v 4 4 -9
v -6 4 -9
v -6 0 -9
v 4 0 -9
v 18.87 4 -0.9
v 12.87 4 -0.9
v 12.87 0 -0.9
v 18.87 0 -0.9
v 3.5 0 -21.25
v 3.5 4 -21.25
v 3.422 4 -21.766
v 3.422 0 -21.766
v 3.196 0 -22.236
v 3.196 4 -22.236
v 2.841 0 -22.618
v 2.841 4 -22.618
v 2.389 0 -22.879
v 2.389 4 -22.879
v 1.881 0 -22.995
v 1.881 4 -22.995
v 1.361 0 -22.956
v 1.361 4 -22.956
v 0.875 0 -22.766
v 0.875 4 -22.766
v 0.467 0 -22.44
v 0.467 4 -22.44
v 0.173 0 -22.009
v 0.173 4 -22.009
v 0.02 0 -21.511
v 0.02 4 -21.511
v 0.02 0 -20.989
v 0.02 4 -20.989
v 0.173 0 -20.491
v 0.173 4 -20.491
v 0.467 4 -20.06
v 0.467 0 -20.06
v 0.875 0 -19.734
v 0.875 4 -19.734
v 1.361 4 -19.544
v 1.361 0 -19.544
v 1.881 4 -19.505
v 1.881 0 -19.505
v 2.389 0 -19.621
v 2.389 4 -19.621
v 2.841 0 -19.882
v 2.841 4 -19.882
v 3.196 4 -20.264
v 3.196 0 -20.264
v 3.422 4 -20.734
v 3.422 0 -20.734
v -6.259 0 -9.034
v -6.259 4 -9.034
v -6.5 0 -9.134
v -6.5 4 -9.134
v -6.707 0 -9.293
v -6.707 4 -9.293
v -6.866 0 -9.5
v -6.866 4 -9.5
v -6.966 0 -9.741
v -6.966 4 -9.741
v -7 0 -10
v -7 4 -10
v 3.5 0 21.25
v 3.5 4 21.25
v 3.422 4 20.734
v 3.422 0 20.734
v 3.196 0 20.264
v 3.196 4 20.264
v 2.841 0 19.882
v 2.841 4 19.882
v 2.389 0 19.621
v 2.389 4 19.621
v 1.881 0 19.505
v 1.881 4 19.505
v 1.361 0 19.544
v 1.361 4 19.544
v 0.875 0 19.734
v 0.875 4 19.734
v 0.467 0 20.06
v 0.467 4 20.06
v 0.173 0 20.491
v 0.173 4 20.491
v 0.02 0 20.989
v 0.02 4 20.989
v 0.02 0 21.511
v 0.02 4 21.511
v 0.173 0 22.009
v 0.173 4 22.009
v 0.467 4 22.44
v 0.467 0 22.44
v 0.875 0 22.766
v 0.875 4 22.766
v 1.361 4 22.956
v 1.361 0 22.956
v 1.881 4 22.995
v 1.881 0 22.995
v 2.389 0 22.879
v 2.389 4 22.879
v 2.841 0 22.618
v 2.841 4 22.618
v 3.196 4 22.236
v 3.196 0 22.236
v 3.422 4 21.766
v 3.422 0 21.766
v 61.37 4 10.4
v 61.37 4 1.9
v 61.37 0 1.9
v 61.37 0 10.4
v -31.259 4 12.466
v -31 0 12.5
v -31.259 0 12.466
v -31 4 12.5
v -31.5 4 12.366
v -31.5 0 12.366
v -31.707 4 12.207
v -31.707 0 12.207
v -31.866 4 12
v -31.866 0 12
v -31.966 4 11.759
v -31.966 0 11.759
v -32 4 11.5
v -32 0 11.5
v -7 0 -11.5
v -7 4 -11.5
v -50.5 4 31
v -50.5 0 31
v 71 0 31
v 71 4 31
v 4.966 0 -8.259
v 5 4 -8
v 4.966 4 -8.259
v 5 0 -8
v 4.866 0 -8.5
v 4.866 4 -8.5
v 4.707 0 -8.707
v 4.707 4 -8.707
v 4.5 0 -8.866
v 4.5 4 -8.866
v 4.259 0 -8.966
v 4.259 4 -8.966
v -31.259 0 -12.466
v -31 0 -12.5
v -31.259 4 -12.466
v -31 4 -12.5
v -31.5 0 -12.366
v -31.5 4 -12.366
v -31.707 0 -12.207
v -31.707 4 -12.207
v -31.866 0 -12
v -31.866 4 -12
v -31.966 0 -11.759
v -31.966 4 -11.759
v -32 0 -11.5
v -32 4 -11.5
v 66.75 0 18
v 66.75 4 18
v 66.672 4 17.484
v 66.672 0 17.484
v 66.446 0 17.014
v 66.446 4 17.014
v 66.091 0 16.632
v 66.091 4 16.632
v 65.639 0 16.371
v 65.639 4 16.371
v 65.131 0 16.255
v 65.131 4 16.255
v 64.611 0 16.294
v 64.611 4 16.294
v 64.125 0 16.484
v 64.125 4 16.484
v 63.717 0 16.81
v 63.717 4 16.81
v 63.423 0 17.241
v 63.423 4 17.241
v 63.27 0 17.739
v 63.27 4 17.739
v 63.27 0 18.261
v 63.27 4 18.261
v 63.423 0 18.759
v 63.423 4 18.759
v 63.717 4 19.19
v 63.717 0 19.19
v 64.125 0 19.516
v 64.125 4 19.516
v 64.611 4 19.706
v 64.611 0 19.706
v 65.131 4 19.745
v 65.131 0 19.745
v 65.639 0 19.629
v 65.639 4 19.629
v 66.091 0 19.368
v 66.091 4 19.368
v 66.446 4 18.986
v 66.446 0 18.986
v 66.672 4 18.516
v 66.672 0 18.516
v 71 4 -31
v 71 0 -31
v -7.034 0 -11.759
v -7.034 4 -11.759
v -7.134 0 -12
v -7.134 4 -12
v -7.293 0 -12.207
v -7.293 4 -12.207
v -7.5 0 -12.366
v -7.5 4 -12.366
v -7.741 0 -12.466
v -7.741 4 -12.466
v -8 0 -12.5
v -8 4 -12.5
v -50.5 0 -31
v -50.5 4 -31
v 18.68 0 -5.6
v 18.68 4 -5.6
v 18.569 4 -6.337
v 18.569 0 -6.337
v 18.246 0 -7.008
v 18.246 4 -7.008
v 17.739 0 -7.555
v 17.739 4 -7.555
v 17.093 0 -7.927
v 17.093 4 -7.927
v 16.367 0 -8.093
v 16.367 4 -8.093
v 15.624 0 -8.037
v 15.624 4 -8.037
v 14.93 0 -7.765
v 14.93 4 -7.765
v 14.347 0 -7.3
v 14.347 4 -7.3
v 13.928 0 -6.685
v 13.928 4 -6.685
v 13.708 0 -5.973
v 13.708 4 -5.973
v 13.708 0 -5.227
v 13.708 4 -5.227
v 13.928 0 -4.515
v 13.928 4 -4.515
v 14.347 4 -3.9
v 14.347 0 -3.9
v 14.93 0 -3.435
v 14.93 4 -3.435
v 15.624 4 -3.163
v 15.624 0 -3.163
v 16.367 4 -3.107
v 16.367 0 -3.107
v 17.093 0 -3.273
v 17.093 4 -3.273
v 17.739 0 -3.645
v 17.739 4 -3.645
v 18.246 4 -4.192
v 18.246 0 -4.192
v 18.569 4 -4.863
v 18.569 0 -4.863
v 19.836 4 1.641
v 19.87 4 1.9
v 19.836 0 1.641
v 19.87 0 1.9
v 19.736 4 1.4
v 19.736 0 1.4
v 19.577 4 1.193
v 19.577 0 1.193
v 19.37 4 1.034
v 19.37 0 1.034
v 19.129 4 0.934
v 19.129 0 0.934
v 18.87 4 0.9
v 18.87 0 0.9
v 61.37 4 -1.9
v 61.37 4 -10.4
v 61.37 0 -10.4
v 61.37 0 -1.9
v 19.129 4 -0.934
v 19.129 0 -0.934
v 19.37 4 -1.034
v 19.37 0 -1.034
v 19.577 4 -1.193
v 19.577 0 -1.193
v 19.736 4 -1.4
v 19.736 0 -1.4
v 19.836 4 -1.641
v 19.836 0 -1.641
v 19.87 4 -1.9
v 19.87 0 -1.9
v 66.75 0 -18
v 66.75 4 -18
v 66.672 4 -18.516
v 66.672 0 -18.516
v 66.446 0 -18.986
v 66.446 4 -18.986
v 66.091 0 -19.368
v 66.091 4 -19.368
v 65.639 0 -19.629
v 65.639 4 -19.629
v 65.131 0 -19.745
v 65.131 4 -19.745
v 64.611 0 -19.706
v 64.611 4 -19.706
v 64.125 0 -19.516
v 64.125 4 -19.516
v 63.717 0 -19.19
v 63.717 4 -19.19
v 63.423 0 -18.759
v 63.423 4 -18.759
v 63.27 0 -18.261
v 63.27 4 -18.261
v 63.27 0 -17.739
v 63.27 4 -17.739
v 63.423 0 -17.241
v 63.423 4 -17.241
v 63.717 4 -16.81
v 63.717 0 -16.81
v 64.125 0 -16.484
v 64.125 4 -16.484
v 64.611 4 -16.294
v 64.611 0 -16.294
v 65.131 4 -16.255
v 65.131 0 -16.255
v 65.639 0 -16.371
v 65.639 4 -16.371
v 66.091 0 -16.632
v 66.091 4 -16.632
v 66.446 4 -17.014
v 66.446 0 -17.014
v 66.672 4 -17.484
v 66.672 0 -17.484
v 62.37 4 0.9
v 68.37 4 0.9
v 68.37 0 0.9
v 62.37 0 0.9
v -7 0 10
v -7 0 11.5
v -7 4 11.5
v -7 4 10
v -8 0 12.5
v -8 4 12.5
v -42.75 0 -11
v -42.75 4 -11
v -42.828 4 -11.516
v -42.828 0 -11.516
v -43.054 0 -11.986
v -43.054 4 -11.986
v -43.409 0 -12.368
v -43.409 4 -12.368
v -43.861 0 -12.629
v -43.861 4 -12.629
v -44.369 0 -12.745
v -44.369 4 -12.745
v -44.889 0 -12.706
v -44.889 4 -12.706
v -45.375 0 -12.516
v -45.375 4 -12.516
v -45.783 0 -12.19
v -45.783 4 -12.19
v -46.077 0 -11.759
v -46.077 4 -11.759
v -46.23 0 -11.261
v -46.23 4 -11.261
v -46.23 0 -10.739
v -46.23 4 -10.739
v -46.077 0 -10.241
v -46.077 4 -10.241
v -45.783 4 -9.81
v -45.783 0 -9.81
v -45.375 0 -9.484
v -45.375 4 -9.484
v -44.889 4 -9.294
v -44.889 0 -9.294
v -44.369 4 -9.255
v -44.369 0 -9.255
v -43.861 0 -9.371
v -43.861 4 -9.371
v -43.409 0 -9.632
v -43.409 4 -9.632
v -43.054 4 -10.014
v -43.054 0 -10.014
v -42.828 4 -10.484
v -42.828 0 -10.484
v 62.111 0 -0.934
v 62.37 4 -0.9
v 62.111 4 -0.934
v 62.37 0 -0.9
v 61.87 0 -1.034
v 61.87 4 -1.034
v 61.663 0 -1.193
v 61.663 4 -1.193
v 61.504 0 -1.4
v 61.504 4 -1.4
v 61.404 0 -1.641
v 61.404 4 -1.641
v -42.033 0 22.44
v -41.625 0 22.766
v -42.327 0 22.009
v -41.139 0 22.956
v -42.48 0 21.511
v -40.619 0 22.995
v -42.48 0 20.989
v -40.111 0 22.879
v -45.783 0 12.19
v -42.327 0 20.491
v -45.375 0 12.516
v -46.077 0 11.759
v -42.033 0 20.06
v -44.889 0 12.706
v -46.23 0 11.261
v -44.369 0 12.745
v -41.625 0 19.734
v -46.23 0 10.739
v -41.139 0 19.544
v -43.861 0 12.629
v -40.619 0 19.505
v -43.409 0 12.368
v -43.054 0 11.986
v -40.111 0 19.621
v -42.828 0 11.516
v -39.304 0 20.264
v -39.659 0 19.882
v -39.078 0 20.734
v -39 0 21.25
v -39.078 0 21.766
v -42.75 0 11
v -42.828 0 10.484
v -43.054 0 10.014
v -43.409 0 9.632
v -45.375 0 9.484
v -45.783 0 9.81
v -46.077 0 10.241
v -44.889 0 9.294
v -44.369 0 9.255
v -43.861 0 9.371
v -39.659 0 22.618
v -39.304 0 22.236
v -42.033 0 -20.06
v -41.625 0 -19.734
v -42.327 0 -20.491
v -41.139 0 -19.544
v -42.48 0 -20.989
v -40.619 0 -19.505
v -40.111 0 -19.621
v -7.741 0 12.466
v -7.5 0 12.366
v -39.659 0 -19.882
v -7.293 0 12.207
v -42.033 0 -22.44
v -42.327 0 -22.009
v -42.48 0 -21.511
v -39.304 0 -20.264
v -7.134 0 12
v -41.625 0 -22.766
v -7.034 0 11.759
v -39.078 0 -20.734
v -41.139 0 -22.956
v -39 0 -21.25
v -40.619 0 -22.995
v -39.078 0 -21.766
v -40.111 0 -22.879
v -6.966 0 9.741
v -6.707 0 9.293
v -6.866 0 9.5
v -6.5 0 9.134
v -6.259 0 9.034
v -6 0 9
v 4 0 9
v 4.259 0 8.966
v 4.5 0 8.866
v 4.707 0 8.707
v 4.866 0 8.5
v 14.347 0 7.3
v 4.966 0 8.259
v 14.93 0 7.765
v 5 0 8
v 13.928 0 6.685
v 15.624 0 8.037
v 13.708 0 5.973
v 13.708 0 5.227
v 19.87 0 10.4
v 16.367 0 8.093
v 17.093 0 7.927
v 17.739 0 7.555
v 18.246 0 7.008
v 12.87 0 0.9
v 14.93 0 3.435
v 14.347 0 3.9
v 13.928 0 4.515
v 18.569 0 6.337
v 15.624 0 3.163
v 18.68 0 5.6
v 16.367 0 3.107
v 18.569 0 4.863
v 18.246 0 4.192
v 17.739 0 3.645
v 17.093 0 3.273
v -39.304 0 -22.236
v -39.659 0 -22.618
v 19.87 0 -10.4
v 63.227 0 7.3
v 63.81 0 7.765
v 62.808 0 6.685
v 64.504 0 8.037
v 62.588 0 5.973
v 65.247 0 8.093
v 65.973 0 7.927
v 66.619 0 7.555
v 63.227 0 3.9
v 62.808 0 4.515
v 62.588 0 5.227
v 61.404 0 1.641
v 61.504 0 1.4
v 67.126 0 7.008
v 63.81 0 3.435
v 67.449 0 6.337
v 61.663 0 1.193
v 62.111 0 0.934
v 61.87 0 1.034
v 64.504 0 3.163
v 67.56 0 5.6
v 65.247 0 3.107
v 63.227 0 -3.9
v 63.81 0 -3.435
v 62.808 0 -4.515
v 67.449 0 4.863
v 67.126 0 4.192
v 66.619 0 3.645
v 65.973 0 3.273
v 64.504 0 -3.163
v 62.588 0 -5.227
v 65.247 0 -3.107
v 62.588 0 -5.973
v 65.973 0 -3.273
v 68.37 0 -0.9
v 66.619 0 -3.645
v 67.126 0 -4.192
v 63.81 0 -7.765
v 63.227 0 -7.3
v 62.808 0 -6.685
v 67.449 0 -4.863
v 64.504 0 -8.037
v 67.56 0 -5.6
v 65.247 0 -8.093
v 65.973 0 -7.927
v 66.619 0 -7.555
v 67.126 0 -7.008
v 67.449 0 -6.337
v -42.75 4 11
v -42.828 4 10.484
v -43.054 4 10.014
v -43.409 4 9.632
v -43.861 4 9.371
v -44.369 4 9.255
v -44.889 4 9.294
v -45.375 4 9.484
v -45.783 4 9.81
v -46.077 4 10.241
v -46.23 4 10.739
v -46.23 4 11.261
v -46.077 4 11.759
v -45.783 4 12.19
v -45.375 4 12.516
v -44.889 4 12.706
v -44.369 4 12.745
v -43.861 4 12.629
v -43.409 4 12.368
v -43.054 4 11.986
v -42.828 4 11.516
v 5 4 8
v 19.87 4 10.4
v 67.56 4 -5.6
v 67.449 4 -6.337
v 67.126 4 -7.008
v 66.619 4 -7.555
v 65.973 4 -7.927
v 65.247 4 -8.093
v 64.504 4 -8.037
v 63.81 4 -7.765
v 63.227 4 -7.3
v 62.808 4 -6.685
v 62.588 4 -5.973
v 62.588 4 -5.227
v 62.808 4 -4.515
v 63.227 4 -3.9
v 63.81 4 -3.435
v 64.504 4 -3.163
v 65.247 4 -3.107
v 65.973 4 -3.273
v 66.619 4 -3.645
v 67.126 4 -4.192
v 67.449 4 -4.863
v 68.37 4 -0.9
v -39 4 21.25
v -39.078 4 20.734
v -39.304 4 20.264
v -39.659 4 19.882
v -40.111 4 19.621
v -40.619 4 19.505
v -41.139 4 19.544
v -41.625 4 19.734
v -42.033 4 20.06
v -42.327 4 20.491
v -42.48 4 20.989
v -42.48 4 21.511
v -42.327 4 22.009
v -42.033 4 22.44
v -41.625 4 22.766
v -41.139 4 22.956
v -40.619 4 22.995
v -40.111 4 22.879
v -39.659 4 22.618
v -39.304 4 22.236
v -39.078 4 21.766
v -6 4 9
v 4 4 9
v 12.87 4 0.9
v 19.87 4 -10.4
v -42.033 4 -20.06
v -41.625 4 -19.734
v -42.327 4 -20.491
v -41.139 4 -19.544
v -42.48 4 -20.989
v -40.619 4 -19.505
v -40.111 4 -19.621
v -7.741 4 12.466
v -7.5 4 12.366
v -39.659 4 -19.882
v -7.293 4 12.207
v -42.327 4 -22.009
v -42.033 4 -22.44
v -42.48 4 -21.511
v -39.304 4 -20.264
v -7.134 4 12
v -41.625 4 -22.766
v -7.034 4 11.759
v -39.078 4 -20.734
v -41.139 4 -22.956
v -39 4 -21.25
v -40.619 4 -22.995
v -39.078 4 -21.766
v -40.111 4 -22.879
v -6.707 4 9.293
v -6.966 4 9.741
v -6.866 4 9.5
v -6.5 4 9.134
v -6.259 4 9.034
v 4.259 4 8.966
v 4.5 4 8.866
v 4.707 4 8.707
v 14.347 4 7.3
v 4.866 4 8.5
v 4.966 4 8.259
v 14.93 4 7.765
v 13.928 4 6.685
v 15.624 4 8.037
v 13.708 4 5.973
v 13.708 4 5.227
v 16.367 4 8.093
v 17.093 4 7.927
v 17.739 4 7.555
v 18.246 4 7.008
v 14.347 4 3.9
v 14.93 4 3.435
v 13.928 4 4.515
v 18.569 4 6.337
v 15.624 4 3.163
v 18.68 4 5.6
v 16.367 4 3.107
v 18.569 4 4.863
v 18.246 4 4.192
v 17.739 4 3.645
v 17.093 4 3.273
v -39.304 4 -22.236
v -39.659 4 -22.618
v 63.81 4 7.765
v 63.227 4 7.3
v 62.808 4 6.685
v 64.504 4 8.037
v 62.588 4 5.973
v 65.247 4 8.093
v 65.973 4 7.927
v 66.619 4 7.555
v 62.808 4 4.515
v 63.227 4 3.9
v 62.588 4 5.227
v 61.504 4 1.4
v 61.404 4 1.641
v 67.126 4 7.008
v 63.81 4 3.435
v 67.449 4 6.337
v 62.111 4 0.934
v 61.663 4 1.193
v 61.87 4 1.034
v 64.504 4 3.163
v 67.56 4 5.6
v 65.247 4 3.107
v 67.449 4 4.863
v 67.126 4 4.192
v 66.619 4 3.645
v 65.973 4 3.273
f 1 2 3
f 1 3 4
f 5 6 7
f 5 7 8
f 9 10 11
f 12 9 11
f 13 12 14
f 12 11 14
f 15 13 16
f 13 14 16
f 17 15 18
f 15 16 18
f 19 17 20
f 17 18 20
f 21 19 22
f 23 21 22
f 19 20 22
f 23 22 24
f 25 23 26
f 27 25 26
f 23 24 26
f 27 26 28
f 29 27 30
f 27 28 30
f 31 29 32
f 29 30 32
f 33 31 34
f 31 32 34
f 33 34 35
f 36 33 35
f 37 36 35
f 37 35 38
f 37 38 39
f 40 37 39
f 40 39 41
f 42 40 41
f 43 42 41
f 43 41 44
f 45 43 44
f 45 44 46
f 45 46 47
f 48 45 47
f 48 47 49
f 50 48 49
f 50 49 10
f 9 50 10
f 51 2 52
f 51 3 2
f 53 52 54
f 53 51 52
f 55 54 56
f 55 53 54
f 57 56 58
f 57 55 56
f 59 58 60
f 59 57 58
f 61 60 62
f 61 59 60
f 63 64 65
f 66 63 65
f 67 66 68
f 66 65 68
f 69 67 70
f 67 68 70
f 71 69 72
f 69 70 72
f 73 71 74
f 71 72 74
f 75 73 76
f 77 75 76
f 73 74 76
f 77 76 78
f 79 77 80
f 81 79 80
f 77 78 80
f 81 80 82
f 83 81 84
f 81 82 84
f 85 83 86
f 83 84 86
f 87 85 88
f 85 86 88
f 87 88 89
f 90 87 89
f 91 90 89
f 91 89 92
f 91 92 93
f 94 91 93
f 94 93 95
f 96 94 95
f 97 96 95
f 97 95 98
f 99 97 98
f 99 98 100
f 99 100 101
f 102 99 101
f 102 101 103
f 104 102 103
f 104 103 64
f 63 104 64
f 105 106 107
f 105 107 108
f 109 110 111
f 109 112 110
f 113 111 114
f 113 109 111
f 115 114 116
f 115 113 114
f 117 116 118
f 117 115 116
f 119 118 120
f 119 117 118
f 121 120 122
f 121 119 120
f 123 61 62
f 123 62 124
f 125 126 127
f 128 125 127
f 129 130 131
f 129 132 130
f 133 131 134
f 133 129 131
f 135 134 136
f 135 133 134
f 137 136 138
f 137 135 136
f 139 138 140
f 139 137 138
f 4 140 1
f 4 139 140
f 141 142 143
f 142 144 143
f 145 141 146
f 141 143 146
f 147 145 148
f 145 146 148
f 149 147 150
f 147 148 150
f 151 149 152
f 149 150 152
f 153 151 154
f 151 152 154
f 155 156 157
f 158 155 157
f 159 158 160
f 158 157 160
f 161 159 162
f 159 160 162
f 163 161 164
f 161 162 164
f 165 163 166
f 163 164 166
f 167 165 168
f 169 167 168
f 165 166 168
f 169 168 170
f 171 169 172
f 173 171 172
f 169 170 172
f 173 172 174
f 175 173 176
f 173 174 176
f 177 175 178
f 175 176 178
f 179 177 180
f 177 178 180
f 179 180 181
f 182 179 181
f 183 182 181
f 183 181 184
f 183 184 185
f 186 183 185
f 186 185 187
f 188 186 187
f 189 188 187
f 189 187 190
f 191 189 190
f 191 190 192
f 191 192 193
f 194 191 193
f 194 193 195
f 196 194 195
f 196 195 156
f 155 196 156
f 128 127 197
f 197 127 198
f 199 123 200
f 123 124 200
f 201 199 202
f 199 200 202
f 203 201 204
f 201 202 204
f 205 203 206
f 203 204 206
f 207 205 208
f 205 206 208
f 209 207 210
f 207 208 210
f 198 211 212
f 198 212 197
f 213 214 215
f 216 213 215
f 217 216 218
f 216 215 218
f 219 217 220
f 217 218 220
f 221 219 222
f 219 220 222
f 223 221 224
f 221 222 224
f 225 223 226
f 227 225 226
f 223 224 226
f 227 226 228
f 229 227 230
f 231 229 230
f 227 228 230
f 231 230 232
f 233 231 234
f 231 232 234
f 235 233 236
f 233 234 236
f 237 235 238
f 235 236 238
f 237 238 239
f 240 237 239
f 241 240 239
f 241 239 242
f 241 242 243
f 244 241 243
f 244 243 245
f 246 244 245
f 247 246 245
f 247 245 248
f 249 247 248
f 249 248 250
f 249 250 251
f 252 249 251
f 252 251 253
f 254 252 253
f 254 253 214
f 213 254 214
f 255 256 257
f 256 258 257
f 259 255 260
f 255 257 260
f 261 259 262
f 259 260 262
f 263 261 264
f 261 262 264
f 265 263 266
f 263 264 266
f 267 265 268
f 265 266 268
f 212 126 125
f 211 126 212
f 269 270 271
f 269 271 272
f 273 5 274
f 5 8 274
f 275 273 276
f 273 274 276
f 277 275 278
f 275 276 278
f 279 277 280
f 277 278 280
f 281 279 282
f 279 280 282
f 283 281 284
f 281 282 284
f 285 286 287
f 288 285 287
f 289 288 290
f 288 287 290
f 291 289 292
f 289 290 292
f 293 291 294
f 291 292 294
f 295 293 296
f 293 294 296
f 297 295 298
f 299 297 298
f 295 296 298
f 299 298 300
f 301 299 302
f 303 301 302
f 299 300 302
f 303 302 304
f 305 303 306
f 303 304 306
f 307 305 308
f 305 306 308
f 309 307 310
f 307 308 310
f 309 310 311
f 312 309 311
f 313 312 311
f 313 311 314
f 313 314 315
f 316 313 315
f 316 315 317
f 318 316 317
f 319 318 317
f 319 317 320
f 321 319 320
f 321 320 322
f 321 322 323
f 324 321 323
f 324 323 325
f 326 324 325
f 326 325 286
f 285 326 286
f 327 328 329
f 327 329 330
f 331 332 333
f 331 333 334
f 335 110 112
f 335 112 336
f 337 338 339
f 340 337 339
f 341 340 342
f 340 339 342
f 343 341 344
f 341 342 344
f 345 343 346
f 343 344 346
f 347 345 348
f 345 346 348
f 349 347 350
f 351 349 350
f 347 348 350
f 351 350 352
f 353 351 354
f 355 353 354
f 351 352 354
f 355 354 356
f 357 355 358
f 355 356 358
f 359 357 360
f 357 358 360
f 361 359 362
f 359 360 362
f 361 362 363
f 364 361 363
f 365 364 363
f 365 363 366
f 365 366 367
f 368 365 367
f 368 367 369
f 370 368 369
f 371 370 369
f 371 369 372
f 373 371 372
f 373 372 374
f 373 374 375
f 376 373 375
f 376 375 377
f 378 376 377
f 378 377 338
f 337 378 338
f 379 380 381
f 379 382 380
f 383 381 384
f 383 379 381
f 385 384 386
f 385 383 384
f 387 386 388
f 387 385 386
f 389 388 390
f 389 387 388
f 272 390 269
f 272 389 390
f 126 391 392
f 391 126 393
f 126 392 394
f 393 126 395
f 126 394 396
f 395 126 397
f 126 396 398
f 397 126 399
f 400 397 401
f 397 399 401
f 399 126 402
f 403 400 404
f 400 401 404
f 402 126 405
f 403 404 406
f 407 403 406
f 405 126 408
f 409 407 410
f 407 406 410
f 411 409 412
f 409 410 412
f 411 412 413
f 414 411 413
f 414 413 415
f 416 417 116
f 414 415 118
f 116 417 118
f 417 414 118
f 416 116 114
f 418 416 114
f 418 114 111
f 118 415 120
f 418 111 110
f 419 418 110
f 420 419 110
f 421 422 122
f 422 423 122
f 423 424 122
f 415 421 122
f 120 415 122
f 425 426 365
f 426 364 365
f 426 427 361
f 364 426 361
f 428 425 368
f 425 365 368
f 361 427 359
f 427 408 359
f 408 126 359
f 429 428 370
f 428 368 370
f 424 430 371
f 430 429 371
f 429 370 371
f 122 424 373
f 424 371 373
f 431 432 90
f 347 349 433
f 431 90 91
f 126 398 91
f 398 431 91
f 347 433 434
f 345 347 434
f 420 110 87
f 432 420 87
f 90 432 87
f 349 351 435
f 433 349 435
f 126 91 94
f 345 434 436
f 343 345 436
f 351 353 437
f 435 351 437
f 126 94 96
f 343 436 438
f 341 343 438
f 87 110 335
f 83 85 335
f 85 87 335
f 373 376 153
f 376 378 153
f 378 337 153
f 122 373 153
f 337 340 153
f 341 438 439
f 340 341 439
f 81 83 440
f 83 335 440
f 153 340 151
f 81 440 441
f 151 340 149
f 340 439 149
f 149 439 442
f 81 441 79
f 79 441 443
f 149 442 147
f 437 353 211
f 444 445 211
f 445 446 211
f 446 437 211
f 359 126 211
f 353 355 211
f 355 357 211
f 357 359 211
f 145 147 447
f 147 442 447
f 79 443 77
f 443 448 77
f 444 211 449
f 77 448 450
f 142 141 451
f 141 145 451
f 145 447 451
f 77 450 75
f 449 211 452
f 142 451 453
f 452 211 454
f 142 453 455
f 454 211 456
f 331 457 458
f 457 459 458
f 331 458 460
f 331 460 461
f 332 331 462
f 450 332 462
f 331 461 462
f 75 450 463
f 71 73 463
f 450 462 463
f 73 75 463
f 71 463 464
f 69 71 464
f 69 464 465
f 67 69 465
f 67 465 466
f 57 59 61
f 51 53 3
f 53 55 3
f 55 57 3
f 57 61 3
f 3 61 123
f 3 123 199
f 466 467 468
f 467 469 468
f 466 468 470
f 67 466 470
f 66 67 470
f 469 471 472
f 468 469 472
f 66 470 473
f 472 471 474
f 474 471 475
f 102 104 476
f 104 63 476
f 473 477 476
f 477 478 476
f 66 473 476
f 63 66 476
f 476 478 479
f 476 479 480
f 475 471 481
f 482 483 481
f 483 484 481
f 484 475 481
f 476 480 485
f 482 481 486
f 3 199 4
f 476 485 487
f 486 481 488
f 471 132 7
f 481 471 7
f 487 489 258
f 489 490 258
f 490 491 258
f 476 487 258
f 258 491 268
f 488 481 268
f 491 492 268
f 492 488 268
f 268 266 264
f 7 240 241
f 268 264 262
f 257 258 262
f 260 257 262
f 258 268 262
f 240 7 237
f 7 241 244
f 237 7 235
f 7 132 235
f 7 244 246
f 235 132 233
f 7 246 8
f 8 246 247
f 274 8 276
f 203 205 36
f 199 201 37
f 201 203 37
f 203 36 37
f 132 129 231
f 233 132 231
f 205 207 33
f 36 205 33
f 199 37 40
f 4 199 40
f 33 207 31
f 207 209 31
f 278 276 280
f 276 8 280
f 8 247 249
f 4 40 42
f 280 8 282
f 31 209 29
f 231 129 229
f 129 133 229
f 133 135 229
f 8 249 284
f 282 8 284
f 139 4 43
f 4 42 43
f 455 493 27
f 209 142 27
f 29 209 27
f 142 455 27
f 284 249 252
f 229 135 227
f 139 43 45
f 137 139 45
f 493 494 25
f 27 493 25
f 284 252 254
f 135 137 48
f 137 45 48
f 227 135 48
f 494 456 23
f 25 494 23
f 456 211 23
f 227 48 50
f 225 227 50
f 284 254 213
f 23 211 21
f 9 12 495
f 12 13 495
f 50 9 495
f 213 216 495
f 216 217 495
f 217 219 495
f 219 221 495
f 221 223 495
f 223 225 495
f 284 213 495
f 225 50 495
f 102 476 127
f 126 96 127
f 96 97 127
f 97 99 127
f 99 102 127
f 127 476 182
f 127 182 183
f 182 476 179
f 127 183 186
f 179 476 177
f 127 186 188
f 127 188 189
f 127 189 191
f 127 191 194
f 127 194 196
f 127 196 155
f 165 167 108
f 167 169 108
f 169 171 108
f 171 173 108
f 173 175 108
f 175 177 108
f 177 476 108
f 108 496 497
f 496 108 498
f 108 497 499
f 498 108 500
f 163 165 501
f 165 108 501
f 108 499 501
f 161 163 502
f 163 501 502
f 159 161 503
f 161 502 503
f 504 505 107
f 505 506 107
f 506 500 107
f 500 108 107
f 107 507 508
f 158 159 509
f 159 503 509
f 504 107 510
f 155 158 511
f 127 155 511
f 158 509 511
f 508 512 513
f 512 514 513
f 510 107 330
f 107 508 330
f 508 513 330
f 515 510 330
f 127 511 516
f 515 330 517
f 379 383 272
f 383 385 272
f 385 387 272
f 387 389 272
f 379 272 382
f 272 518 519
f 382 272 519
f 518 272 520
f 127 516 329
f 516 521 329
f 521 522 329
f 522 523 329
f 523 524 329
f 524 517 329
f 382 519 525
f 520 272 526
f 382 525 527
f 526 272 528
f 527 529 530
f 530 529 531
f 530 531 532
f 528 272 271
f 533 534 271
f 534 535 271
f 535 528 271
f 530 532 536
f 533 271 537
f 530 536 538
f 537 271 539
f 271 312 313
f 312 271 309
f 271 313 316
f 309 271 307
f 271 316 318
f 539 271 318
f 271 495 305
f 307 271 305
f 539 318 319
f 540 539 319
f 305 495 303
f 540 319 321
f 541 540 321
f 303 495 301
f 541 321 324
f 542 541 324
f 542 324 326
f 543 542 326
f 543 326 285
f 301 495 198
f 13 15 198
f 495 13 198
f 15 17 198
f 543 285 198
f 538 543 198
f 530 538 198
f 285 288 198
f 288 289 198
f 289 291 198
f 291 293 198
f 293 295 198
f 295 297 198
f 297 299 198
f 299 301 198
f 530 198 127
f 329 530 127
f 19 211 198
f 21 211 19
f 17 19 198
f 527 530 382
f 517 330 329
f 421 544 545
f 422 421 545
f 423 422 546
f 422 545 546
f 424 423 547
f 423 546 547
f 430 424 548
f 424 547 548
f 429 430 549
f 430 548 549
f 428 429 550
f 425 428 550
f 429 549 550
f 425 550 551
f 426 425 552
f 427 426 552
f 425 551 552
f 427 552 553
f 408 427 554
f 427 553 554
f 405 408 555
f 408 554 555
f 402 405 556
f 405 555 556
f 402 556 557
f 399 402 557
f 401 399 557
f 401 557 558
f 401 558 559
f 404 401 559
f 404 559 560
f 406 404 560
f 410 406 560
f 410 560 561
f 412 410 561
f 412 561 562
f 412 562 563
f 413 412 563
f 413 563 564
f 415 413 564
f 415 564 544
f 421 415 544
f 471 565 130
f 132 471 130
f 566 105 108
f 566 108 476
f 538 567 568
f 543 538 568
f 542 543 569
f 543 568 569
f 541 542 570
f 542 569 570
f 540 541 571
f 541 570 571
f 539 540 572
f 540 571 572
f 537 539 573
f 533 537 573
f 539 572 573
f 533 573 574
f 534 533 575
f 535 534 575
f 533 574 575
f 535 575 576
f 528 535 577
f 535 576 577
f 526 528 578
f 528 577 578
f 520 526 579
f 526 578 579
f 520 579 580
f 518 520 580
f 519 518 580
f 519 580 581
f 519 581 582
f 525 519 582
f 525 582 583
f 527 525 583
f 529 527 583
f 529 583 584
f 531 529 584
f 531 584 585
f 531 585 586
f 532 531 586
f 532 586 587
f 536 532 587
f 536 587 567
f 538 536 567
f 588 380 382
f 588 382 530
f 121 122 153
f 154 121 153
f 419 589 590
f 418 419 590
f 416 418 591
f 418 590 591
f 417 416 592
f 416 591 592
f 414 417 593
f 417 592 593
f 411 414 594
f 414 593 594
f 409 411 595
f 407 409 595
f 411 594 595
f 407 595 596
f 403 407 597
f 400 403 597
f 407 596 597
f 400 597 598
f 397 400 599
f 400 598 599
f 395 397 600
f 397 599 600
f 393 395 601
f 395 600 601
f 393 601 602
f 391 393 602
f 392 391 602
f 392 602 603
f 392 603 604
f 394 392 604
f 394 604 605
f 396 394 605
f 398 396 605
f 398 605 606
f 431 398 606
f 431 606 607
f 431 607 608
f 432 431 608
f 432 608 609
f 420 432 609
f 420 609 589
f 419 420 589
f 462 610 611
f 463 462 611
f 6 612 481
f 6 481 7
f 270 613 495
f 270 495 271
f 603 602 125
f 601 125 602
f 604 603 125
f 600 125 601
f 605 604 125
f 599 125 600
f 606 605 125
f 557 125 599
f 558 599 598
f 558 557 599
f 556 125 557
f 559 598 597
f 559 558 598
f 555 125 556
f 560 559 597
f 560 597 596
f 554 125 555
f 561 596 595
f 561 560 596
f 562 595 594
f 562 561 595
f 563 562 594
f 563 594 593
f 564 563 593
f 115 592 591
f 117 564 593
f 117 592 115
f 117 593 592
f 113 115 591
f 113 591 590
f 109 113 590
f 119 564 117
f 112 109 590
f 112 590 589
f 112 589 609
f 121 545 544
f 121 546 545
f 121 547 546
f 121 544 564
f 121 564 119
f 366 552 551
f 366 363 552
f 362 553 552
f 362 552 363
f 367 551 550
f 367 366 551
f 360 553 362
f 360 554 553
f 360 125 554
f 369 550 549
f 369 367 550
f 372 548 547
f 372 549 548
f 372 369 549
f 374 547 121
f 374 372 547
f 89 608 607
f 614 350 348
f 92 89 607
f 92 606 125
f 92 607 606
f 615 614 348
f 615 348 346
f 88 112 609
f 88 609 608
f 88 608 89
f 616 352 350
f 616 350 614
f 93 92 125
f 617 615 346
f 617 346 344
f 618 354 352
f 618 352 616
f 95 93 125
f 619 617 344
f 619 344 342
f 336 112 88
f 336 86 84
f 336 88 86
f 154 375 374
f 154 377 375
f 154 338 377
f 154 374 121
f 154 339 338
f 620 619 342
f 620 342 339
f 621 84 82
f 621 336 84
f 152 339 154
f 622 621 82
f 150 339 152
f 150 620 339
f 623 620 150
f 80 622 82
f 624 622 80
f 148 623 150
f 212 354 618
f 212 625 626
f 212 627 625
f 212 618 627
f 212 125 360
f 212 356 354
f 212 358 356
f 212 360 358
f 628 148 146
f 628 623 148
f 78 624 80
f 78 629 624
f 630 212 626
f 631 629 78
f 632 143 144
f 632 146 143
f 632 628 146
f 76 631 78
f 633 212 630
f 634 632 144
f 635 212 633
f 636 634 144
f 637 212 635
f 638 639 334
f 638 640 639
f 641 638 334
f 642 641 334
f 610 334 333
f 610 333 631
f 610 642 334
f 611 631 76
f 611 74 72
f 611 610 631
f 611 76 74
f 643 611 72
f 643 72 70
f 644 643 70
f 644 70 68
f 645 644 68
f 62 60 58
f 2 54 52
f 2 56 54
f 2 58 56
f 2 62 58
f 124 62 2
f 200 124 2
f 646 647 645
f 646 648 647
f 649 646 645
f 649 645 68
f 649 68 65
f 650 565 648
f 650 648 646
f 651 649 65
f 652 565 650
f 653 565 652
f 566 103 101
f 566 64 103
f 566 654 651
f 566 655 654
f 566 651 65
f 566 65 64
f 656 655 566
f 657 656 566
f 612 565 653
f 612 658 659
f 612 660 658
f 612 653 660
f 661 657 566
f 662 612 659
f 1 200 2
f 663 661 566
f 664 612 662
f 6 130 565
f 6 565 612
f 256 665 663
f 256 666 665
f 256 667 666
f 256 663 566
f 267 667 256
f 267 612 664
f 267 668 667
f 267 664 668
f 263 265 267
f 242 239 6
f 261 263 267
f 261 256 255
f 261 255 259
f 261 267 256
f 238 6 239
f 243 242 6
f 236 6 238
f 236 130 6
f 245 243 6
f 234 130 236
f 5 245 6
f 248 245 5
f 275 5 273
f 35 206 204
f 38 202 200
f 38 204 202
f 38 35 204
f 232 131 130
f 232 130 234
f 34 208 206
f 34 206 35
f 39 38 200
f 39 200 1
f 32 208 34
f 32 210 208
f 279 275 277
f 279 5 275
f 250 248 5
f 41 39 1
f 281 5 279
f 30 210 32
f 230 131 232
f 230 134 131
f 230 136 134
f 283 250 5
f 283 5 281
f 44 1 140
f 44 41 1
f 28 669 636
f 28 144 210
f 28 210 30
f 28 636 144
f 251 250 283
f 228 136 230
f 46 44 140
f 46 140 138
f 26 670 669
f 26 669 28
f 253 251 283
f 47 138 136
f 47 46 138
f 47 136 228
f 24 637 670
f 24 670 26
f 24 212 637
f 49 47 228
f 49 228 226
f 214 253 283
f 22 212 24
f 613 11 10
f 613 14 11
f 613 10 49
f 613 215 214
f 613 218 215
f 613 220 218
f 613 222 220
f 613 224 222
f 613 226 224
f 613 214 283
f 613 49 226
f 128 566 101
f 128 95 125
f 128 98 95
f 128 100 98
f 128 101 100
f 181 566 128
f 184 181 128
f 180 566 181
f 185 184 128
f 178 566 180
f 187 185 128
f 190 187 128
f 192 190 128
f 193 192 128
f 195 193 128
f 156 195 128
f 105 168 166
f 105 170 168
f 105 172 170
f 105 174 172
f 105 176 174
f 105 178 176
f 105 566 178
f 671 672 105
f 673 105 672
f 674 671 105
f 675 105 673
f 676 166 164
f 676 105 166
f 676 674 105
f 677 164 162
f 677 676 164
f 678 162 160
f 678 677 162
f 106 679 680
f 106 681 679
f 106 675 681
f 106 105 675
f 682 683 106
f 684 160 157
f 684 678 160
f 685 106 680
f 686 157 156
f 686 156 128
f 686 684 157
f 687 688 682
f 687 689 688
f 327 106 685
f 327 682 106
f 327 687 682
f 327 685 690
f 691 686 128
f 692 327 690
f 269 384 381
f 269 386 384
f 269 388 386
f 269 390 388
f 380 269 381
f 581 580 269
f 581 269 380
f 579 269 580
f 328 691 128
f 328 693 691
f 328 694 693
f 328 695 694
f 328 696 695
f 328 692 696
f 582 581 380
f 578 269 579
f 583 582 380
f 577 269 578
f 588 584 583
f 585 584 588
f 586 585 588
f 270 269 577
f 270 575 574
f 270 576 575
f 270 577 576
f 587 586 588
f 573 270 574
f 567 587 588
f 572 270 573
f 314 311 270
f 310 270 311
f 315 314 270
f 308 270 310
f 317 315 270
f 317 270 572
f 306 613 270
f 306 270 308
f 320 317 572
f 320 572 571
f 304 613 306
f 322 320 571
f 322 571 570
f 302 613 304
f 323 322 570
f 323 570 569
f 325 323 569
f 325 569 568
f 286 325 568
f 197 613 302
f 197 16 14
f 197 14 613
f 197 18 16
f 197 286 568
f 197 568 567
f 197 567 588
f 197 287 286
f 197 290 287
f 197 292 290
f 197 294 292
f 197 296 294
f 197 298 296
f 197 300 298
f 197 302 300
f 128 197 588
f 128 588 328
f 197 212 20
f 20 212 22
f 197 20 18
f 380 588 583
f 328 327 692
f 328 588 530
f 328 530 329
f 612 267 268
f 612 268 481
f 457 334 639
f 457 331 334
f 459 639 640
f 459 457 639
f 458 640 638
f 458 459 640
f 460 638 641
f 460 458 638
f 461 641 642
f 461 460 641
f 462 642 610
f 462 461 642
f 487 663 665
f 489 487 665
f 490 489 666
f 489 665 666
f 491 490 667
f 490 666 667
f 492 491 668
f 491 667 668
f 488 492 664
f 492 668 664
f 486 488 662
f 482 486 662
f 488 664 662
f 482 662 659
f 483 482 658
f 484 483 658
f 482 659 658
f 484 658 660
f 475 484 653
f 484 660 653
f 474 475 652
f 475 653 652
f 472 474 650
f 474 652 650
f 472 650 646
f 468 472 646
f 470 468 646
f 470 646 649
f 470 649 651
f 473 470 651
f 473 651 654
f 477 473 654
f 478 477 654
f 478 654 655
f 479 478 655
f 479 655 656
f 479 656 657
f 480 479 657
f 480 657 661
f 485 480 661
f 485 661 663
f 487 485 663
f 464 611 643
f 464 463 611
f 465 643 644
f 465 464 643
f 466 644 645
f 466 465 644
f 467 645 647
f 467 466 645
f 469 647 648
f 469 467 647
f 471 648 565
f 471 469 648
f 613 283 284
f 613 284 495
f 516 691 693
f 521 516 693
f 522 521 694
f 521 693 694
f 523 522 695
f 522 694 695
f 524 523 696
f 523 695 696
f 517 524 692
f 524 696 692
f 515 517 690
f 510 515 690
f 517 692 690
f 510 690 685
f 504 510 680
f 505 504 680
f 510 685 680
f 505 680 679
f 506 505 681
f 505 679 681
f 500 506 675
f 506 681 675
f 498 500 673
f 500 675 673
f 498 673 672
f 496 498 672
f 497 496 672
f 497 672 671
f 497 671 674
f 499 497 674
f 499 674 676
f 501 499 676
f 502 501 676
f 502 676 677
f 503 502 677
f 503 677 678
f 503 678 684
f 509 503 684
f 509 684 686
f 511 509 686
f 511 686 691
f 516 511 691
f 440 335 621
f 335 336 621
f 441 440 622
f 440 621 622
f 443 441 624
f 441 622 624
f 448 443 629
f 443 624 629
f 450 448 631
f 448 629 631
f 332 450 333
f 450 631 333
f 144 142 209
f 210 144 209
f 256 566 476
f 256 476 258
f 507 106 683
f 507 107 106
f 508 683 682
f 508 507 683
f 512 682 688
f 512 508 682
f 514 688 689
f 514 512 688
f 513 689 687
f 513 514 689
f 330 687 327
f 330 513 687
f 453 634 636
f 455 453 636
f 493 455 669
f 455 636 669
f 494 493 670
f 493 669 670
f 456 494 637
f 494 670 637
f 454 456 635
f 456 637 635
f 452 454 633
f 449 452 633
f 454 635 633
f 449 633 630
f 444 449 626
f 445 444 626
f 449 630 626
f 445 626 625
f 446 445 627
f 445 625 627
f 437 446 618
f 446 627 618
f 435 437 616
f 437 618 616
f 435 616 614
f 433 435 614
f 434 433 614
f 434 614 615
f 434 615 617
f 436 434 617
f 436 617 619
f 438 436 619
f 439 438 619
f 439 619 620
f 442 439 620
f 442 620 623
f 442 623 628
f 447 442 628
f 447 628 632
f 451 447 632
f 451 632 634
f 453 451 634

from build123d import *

# Parameters (mm, degrees)
SKETCH1_W           = 121.5
SKETCH1_H           = 62
SKETCH1_W_2         = 25
SKETCH1_H_2         = 25
BOSS_EXTRUDE1_DEPTH = 4
SKETCH2_R           = 2.5
CUT_EXTRUDE1_DEPTH  = 5
SKETCH3_R           = 1.75
CUT_EXTRUDE2_DEPTH  = 5
SKETCH4_W           = 12
SKETCH4_H           = 18
CUT_EXTRUDE3_DEPTH  = 5
FILLET1_R           = 1


with BuildPart() as part:
    # Sketch1 → Boss-Extrude1 (new body)
    with BuildSketch(Plane(origin=(0, 0, 0), x_dir=(1, 0, 0), z_dir=(0, 1, 0))):
        with Locations((10.25, 0)):
            Rectangle(SKETCH1_W, SKETCH1_H)
        with Locations((-19.5, 0)):
            Rectangle(SKETCH1_W_2, SKETCH1_H_2, mode=Mode.SUBTRACT)
    extrude(amount=BOSS_EXTRUDE1_DEPTH)

    # Sketch2 → Cut-Extrude1 (cut, through all)
    with BuildSketch(Plane(origin=(0, 4, 0), x_dir=(1, 0, 0), z_dir=(0, 1, 0))):
        with Locations((16.18, 5.6)):
            Circle(SKETCH2_R)
        with Locations((16.18, -5.6)):
            Circle(SKETCH2_R)
        with Locations((65.06, -5.6)):
            Circle(SKETCH2_R)
        with Locations((65.06, 5.6)):
            Circle(SKETCH2_R)
        Polygon((19.87, -0.9), (12.87, -0.9), (12.87, 0.9), (19.87, 0.9), (19.87, 10.4), (61.37, 10.4), (61.37, 0.9), (68.37, 0.9), (68.37, -0.9), (61.37, -0.9), (61.37, -10.4), (19.87, -10.4), align=None)
    extrude(amount=-CUT_EXTRUDE1_DEPTH, mode=Mode.SUBTRACT)

    # Sketch3 → Cut-Extrude2 (cut, through all)
    with BuildSketch(Plane(origin=(0, 4, 0), x_dir=(1, 0, 0), z_dir=(0, 1, 0))):
        with Locations((-40.75, -21.25)):
            Circle(SKETCH3_R)
        with Locations((-44.5, -11)):
            Circle(SKETCH3_R)
        with Locations((1.75, -21.25)):
            Circle(SKETCH3_R)
        with Locations((1.75, 21.25)):
            Circle(SKETCH3_R)
        with Locations((65, 18)):
            Circle(SKETCH3_R)
        with Locations((65, -18)):
            Circle(SKETCH3_R)
        with Locations((-44.5, 11)):
            Circle(SKETCH3_R)
        with Locations((-40.75, 21.25)):
            Circle(SKETCH3_R)
    extrude(amount=-CUT_EXTRUDE2_DEPTH, mode=Mode.SUBTRACT)

    # Sketch4 → Cut-Extrude3 (cut, through all)
    with BuildSketch(Plane(origin=(0, 4, 0), x_dir=(1, 0, 0), z_dir=(0, 1, 0))):
        with Locations((-1, 0)):
            Rectangle(SKETCH4_W, SKETCH4_H)
    extrude(amount=-CUT_EXTRUDE3_DEPTH, mode=Mode.SUBTRACT)

    # Fillet1
    fillet1_edges = [part.edges().sort_by_distance(p)[0] for p in [
        (-7, 2, 9),
        (-7, 2, -9),
        (5, 2, -9),
        (5, 2, 9),
        (-32, 2, -12.5),
        (-32, 2, 12.5),
        (-7, 2, 12.5),
        (-7, 2, -12.5),
        (19.87, 2, -0.9),
        (61.37, 2, -0.9),
        (61.37, 2, 0.9),
        (19.87, 2, 0.9),
    ]]
    fillet(fillet1_edges, radius=FILLET1_R)


solid = part.part
